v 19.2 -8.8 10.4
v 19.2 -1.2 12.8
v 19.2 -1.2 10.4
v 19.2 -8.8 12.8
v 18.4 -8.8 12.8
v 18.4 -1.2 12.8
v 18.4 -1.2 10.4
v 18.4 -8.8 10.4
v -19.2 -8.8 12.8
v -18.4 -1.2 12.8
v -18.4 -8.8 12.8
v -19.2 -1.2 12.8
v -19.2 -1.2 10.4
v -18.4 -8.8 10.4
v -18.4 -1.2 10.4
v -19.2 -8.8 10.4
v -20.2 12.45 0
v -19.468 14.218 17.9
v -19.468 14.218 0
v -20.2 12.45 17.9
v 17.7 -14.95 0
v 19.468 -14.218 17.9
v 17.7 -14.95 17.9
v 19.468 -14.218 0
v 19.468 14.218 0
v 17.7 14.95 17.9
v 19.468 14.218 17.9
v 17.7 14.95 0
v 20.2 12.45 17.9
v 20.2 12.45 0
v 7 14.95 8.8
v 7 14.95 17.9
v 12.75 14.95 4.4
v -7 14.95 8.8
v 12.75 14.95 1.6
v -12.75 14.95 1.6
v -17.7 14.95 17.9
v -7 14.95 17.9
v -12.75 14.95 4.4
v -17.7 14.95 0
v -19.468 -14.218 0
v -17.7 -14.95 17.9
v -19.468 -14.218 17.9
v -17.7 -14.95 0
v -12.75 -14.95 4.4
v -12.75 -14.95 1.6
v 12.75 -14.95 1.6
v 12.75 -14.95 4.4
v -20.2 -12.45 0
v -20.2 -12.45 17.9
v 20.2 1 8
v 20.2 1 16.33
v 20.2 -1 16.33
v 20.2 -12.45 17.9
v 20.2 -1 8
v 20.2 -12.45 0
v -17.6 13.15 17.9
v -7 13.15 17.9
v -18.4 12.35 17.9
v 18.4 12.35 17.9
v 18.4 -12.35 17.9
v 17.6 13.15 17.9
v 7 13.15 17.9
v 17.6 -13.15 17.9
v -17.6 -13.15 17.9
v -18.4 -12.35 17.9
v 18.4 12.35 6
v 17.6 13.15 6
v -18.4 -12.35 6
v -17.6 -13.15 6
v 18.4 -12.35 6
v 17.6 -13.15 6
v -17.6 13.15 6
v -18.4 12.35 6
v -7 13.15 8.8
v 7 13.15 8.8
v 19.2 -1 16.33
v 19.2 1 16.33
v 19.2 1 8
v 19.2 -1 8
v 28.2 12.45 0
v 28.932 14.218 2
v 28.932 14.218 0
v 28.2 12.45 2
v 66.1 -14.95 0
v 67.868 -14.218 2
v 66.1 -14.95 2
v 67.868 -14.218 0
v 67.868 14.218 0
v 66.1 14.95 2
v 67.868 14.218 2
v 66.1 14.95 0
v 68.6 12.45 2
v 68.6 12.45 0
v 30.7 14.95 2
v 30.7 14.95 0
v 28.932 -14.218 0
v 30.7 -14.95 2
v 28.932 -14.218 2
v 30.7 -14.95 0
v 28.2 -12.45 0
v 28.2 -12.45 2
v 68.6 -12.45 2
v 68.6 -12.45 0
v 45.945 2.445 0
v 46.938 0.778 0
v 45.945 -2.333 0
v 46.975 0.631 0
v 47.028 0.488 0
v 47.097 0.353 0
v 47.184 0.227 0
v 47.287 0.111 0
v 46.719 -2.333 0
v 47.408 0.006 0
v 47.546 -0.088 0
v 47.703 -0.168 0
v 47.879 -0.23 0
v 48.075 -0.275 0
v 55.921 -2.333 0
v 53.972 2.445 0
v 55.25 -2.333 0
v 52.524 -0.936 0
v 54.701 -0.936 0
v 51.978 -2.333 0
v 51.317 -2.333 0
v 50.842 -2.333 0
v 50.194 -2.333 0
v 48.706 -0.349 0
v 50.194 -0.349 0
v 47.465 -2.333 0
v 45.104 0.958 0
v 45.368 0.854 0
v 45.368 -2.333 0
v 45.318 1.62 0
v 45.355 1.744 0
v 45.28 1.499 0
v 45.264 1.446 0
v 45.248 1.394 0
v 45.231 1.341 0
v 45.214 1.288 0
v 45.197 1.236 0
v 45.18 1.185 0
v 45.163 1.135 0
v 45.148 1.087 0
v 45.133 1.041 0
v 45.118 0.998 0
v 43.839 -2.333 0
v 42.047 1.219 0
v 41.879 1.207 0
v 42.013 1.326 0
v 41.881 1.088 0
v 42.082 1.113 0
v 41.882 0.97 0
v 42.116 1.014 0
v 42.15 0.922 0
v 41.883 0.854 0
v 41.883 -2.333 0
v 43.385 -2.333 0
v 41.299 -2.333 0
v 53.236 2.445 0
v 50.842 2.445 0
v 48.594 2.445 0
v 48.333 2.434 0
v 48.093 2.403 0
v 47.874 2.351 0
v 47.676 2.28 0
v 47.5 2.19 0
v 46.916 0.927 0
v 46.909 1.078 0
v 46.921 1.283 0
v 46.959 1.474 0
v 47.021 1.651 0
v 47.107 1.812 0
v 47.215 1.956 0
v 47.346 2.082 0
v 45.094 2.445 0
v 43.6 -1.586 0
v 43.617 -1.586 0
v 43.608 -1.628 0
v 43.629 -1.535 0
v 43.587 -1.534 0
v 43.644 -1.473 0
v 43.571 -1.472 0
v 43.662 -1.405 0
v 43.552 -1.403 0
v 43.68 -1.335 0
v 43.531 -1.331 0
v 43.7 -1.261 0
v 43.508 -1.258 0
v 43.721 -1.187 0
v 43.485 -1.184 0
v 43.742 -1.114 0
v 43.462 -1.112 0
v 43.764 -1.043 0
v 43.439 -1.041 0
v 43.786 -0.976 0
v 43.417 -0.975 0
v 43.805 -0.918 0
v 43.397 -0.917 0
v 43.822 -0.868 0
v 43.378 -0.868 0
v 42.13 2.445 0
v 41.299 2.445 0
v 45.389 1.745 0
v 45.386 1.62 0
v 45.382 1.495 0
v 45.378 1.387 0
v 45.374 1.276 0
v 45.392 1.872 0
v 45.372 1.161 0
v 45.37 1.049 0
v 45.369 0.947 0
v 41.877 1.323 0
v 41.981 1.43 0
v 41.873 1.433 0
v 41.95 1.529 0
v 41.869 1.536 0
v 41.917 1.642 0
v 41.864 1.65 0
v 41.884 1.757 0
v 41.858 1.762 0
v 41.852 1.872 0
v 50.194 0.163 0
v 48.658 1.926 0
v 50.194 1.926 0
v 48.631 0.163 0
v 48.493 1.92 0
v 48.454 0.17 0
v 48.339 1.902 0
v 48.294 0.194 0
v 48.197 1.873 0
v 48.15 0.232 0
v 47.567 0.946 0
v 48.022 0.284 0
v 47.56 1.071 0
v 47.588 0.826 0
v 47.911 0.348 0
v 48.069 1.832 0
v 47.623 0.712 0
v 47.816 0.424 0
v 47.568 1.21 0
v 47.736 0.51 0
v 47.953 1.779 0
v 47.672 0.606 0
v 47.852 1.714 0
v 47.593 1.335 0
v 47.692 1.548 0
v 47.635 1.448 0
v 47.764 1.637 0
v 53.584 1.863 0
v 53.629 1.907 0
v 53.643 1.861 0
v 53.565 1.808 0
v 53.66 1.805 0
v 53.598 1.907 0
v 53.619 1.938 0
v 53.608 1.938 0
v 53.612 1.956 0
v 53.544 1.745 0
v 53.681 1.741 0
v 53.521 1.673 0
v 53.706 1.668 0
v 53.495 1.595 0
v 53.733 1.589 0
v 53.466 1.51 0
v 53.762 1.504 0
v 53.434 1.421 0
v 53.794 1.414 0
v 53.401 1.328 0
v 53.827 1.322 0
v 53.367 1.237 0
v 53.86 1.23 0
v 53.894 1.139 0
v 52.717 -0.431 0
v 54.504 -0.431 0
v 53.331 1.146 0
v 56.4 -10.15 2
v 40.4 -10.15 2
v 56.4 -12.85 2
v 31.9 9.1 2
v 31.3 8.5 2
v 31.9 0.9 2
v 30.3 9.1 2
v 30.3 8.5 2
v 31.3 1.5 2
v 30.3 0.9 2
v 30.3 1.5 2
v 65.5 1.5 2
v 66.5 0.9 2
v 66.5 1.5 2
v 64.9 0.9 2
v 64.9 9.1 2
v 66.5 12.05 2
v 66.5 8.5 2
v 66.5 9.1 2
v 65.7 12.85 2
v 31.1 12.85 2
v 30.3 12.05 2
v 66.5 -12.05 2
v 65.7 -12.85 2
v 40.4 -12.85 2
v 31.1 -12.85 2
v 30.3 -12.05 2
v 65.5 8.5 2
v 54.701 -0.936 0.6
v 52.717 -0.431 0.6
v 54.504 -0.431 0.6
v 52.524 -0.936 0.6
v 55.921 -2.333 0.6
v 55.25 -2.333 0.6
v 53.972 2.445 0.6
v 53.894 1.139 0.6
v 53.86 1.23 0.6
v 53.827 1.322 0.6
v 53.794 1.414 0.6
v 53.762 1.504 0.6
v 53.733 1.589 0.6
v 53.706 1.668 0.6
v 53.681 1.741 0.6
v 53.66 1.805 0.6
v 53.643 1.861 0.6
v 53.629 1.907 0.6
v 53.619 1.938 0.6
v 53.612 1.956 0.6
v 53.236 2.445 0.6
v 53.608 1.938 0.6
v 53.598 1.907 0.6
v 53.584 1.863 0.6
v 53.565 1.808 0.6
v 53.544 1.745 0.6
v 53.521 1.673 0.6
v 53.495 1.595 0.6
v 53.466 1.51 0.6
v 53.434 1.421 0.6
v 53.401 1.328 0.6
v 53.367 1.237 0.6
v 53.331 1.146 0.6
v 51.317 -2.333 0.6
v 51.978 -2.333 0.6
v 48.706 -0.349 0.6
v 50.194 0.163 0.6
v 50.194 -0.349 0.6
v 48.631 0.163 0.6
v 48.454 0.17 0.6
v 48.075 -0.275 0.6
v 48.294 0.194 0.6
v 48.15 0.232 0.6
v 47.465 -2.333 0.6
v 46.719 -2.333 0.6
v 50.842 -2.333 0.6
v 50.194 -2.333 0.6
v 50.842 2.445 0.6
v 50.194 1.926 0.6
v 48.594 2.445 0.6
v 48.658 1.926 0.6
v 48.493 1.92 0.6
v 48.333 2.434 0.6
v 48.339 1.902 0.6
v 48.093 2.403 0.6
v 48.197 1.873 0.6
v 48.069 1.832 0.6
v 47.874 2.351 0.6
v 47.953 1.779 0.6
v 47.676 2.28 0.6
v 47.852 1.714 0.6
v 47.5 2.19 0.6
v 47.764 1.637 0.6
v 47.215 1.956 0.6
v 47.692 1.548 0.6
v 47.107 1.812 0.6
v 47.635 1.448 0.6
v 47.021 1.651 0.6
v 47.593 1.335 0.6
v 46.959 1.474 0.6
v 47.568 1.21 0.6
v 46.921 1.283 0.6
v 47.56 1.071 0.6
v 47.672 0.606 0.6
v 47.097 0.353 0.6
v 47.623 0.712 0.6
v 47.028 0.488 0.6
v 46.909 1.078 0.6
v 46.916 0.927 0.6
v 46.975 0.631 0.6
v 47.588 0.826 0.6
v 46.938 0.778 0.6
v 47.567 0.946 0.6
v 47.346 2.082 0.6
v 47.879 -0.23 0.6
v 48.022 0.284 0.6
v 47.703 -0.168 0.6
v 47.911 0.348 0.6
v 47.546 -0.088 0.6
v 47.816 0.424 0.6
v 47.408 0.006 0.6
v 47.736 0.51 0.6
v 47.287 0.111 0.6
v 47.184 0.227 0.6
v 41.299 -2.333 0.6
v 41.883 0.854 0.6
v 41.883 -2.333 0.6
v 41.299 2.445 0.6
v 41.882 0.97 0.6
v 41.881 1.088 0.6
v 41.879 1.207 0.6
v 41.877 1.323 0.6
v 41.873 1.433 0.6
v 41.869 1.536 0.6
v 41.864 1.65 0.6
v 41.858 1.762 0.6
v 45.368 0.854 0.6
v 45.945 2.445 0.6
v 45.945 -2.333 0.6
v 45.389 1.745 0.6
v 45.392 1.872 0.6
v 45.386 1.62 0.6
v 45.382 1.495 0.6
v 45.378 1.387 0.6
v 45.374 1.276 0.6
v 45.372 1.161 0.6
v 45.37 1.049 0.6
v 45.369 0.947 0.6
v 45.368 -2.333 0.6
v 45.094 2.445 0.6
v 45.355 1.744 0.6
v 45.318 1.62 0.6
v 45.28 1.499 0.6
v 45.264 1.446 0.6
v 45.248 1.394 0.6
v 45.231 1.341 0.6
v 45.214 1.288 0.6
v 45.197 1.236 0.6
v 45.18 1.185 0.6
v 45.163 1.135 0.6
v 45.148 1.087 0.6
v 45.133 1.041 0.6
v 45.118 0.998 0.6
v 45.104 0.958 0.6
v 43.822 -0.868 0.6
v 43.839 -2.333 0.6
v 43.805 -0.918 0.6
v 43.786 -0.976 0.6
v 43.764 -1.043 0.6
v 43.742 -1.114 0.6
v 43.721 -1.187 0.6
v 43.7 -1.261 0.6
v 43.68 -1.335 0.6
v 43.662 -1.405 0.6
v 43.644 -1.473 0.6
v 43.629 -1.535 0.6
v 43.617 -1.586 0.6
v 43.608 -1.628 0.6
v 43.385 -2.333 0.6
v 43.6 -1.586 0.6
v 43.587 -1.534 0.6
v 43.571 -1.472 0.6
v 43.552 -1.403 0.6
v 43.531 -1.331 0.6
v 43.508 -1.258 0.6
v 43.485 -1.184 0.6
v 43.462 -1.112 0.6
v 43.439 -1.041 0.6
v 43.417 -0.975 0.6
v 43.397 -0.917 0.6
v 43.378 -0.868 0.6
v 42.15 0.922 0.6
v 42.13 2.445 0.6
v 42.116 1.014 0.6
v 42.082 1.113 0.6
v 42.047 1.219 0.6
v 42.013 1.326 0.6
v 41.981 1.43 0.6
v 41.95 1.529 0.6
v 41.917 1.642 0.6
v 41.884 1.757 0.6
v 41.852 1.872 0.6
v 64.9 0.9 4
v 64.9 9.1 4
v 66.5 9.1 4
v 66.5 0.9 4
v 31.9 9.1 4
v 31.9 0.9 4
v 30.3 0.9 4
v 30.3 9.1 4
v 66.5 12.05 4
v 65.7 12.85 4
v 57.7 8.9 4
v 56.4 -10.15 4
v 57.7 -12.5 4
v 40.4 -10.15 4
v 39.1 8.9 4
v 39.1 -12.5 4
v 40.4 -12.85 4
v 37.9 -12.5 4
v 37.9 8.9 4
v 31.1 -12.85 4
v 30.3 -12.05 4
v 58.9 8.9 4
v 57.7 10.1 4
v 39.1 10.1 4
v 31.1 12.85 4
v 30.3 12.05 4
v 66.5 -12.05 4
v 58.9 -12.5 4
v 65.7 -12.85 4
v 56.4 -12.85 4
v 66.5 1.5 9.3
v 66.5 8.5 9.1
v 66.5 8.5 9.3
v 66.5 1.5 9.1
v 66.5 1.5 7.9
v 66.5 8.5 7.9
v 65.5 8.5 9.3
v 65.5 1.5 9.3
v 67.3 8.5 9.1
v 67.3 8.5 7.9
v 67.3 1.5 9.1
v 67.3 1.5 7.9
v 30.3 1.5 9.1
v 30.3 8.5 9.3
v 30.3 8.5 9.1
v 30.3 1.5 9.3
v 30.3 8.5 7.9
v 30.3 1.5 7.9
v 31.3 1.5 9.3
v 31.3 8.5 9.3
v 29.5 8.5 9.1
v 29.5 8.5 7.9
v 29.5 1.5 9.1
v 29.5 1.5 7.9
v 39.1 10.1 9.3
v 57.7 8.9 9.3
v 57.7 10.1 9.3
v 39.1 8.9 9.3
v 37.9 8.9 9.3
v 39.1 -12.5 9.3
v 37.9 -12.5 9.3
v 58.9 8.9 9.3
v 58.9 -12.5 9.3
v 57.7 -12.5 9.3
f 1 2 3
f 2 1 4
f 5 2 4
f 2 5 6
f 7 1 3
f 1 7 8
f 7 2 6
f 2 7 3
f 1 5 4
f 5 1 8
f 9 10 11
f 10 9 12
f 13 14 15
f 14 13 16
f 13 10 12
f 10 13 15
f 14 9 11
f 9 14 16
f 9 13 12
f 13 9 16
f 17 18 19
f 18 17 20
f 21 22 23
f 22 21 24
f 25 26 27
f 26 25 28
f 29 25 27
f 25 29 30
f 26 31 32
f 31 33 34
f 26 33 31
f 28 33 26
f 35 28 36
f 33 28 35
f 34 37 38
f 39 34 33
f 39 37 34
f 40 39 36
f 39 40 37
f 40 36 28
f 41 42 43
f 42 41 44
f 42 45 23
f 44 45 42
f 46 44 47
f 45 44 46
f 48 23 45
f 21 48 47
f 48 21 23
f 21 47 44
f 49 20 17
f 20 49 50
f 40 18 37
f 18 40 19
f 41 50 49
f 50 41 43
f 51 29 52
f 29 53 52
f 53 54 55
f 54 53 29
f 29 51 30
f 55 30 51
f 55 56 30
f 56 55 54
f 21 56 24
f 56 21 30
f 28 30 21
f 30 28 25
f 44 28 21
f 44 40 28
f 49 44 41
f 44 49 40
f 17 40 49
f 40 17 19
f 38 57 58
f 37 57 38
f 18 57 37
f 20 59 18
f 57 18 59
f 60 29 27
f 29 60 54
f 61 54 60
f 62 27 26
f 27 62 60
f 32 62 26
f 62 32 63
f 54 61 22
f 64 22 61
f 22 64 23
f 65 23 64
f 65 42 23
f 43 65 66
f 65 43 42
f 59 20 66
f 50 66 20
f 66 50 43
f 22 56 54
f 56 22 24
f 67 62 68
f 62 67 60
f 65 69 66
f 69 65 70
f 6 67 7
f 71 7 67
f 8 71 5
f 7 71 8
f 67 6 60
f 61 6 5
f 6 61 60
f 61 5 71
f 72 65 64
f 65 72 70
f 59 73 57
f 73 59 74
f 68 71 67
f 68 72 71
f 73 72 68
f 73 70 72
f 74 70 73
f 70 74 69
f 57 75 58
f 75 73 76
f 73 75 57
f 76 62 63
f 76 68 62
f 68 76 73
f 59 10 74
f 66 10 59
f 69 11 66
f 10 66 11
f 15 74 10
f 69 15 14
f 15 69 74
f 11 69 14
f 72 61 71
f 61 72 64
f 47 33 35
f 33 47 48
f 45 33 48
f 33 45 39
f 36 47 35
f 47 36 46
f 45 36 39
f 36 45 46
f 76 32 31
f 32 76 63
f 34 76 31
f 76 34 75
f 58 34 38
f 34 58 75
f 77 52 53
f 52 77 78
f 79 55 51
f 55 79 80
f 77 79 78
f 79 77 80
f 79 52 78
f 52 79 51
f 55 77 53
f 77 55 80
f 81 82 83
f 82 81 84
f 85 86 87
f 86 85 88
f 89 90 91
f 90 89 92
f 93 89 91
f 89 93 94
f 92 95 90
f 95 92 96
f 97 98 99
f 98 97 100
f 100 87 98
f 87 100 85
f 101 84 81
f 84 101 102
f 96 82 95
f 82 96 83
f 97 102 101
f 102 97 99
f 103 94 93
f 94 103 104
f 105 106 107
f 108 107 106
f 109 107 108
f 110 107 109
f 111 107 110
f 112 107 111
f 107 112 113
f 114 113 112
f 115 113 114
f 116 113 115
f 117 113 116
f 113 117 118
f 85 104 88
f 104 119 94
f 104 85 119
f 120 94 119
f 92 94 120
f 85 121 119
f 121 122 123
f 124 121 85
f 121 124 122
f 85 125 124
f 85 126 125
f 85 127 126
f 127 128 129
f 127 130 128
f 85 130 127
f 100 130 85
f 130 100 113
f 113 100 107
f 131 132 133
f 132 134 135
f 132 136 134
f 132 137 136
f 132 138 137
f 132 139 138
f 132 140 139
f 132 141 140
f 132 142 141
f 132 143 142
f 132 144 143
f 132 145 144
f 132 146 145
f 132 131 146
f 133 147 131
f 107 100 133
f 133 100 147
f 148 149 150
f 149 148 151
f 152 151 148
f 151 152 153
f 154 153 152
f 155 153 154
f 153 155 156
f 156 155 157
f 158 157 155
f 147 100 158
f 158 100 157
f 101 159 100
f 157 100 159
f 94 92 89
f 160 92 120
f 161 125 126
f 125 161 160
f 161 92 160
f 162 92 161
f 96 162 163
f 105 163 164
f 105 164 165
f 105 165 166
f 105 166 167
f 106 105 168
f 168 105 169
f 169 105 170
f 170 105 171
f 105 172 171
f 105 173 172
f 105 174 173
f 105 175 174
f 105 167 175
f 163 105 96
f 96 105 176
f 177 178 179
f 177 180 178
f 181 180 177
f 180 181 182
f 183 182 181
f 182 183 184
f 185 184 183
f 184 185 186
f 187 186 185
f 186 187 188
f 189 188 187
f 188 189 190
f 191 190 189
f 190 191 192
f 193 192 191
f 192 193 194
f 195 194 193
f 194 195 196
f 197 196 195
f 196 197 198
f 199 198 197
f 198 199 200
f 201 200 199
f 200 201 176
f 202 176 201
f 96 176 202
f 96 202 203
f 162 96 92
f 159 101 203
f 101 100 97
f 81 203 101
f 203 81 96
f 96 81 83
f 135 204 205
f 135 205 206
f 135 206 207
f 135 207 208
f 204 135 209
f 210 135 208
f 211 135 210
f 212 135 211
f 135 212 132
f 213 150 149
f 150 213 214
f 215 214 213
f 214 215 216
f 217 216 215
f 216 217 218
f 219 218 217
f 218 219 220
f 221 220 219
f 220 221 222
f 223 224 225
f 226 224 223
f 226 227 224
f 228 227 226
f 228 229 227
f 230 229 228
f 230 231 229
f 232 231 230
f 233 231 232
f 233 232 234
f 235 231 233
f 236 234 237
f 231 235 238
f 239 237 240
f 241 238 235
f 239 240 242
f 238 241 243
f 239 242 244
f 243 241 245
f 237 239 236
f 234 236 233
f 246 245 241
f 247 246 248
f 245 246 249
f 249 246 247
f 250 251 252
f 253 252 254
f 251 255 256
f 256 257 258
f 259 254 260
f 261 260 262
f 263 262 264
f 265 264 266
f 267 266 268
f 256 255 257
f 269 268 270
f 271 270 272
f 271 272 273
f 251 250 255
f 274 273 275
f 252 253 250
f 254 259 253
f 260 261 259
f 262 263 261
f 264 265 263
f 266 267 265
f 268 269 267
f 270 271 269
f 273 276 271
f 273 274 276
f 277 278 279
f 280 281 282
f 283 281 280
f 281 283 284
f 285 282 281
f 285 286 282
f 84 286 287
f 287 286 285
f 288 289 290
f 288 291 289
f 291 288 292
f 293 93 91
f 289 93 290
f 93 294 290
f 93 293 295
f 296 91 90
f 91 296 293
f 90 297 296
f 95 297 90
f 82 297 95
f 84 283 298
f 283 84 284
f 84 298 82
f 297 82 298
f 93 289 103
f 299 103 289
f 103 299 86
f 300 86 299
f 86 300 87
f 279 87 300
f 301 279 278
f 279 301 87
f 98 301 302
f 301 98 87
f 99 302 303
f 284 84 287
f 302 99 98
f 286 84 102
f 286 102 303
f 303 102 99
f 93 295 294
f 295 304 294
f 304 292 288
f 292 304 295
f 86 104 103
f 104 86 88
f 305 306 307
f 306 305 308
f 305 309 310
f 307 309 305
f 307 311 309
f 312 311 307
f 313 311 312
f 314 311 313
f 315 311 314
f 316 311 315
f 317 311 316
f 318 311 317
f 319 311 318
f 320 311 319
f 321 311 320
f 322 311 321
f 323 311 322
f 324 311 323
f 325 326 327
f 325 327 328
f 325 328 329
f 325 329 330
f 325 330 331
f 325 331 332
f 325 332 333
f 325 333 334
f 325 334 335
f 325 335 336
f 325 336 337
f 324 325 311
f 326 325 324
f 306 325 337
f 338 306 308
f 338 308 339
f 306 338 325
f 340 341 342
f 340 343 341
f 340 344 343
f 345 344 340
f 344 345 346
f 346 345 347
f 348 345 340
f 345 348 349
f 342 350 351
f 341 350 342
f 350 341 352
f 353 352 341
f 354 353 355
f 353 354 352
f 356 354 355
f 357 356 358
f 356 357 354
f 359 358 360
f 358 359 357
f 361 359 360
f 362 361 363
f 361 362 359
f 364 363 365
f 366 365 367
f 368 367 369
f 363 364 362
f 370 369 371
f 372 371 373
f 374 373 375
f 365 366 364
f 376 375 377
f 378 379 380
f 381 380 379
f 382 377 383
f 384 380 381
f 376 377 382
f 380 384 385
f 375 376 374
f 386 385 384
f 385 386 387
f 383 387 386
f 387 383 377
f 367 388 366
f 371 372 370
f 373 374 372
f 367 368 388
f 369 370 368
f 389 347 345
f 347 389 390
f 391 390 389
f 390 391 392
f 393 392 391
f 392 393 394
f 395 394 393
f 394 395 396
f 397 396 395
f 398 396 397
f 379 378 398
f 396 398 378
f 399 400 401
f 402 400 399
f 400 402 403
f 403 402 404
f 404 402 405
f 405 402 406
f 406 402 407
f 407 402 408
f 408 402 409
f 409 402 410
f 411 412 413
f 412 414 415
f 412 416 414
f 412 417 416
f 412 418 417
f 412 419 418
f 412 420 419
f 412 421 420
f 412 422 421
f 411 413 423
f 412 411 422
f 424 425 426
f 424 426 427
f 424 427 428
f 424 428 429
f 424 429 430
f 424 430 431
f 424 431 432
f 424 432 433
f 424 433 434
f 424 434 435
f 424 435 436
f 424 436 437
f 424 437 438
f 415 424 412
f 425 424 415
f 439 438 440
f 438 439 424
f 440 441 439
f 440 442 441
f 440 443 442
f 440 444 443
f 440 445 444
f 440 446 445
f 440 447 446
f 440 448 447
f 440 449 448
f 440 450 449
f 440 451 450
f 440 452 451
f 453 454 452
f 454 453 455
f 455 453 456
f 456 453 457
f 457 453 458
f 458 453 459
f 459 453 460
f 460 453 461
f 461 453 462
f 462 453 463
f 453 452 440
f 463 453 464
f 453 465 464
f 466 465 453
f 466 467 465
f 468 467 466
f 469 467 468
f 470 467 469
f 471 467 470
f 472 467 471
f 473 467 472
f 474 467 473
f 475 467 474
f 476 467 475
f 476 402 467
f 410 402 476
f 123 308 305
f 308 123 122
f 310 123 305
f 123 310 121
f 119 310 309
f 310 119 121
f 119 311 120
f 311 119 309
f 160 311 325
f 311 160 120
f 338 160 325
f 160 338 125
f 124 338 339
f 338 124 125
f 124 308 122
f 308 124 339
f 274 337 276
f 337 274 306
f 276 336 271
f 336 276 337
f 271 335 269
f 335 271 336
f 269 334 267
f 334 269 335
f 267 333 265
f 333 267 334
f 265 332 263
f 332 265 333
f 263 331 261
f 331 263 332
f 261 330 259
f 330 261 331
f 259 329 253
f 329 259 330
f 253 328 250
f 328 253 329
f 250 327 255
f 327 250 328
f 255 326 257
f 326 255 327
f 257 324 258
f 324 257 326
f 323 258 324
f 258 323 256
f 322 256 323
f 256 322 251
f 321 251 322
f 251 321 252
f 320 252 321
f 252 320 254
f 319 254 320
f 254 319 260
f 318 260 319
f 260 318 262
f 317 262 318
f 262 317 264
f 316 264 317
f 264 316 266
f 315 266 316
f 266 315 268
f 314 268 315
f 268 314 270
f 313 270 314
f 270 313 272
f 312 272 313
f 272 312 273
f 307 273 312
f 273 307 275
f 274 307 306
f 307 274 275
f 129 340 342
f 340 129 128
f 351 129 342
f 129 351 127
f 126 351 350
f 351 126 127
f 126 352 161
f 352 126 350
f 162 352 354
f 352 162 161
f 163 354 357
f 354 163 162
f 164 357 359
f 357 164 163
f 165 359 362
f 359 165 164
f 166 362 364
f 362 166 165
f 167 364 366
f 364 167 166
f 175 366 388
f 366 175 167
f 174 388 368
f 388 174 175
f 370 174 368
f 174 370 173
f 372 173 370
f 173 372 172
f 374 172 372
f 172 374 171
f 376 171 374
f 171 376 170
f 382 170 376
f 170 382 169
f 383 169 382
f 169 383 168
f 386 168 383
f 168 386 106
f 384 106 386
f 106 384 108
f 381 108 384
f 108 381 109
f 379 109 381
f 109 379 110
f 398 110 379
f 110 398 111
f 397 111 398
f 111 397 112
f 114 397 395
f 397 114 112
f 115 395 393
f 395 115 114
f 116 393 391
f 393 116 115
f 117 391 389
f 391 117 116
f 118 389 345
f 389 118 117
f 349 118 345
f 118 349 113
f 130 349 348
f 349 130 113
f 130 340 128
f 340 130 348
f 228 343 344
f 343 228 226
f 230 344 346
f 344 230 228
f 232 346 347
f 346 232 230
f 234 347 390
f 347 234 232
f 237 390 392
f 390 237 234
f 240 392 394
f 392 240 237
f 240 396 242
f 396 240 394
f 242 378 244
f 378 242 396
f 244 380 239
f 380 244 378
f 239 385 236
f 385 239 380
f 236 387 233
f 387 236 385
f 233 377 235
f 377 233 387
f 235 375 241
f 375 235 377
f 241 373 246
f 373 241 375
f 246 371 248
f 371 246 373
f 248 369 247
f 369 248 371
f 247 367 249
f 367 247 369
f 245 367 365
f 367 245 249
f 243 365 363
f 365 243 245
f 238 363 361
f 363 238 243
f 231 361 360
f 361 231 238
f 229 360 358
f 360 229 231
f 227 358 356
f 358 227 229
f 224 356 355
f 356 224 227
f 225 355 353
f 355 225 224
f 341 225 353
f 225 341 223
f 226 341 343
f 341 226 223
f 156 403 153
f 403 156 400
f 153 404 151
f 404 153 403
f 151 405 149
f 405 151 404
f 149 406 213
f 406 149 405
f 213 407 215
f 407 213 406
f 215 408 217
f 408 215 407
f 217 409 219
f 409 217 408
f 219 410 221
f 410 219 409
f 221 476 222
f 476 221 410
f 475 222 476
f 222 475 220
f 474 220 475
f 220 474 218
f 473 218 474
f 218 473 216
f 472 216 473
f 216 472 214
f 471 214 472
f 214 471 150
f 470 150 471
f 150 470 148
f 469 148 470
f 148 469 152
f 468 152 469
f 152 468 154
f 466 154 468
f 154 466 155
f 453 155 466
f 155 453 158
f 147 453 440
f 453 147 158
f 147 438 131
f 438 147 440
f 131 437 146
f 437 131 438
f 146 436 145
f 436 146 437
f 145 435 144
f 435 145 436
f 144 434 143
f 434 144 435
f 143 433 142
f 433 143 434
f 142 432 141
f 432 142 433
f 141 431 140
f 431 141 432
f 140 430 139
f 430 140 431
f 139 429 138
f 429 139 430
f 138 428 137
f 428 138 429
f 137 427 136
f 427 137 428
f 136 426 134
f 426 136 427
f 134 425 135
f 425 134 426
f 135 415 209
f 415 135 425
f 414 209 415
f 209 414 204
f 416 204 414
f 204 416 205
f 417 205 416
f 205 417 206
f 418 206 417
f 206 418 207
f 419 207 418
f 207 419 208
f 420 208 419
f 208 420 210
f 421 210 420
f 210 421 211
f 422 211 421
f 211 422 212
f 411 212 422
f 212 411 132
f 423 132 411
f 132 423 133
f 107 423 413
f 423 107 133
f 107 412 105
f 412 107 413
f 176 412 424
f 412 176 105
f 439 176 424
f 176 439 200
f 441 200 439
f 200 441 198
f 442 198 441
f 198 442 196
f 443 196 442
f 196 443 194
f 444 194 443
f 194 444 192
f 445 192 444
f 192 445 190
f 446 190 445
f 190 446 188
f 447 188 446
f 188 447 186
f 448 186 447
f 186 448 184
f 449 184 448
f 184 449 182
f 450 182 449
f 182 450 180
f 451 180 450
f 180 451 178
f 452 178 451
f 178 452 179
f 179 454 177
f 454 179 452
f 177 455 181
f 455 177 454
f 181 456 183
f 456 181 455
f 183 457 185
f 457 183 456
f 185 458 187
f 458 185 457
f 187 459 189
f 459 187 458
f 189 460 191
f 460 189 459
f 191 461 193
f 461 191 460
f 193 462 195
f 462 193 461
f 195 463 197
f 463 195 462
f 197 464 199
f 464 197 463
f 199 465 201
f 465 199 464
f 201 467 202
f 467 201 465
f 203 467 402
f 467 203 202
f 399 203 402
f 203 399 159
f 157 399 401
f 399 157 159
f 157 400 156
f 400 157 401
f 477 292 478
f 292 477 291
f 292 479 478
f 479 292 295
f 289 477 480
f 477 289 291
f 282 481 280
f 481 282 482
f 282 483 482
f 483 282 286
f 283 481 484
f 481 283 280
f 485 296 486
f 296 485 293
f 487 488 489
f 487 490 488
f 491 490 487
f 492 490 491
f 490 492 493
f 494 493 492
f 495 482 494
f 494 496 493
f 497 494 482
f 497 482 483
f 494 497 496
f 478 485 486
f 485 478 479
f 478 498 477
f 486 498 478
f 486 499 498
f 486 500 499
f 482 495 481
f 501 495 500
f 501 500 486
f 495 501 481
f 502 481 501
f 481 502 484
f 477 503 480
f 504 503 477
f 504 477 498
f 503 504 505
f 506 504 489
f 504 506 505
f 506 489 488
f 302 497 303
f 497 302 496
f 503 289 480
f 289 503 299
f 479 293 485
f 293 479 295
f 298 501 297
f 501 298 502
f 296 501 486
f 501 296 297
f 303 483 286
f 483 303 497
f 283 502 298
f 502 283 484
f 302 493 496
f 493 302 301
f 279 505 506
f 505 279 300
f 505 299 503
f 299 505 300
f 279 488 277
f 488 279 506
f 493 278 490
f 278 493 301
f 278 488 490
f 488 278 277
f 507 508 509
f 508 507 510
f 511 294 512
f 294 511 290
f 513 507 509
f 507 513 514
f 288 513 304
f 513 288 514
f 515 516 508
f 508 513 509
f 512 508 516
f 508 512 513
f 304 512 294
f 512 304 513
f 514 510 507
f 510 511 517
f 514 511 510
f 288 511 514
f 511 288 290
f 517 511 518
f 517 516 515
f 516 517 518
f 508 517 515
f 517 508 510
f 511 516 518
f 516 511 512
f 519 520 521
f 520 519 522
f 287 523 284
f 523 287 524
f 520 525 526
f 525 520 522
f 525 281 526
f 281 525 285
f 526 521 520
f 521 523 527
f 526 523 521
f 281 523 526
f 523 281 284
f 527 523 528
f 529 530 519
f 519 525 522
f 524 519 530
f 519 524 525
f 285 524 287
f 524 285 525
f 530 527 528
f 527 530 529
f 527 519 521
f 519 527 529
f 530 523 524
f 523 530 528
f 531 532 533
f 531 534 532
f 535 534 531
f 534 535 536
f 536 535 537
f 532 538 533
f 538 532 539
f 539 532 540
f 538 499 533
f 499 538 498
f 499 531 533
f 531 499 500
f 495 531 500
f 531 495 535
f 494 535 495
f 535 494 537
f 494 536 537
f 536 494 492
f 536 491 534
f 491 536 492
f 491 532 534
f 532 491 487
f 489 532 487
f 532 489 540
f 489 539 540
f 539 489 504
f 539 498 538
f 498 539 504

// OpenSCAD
// VolleyBand sensor pod case  v4

batt  = [36, 25.5, 4.3];
board = [17.8, 21, 4];
wall  = 1.8;
floor_t = 6;
foam  = 1.2;

inner = [batt[0] + 0.8, batt[1] + 0.8];
depth = batt[2] + board[2] + foam + 2.4;
outer = [inner[0] + 2*wall, inner[1] + 2*wall, floor_t + depth];

module rbox(s, r) {
  linear_extrude(s[2]) offset(r) square([s[0] - 2*r, s[1] - 2*r], center=true);
}

difference() {
  rbox(outer, 2.5);
  // cavity for the battery and board
  translate([0, 0, floor_t]) rbox([inner[0], inner[1], depth + 1], 0.8);
  // strap tunnel
  translate([-12.75, -outer[1]/2 - 1, 1.6]) cube([25.5, outer[1] + 2, 2.8]);
  // USB-C opening
  translate([-7, outer[1]/2 - wall - 1, floor_t + batt[2] - 1.5]) cube([14, wall + 2, depth]);
  // alignment groove
  translate([outer[0]/2 - 1, -1, floor_t + 2]) cube([1.1, 2, depth * 0.7]);
  // grooves the lid clips snap into
  for (m = [0, 1]) mirror([m, 0, 0]) translate([inner[0]/2 - 0.1, -8.8, outer[2] - 7.5]) cube([0.9, 7.6, 2.4]);
}

// lid, flat side down like it prints
translate([outer[0] + 8, 0, 0]) {
  // plate, with ARM cut into the underside
  difference() {
    rbox([outer[0], outer[1], 2], 2.5);
    translate([0, 0, -1]) linear_extrude(1.6) mirror([1, 0, 0]) text("ARM", size=5, halign="center", valign="center");
  }
  // lip that sits inside the case
  translate([0, 0, 2]) difference() {
    rbox([inner[0] - 0.6, inner[1] - 0.6, 2], 0.8);
    for (m = [0, 1]) mirror([m, 0, 0]) translate([inner[0]/2 - 1.9, 0.9, -1]) cube([3, 8.2, 4]);
    translate([-8, -inner[1]/2 - 1, -1]) cube([16, 4, 4]);
  }
  // ribs that hold the board
  translate([0, -2, 4]) linear_extrude(5.3) difference() {
    offset(1.2) square([board[0] + 0.8, board[1] + 0.8], center=true);
    square([board[0] + 0.8, board[1] + 0.8], center=true);
    translate([0, -(board[1]/2 + 2)]) square([board[0] + 6, 4], center=true);
  }
  // snap clips
  for (m = [0, 1]) mirror([m, 0, 0]) translate([inner[0]/2 - 1.3, 1.5, 2]) {
    cube([1, 7, 7.3]);
    translate([1, 0, 5.9]) cube([0.8, 7, 1.2]);
  }
}
